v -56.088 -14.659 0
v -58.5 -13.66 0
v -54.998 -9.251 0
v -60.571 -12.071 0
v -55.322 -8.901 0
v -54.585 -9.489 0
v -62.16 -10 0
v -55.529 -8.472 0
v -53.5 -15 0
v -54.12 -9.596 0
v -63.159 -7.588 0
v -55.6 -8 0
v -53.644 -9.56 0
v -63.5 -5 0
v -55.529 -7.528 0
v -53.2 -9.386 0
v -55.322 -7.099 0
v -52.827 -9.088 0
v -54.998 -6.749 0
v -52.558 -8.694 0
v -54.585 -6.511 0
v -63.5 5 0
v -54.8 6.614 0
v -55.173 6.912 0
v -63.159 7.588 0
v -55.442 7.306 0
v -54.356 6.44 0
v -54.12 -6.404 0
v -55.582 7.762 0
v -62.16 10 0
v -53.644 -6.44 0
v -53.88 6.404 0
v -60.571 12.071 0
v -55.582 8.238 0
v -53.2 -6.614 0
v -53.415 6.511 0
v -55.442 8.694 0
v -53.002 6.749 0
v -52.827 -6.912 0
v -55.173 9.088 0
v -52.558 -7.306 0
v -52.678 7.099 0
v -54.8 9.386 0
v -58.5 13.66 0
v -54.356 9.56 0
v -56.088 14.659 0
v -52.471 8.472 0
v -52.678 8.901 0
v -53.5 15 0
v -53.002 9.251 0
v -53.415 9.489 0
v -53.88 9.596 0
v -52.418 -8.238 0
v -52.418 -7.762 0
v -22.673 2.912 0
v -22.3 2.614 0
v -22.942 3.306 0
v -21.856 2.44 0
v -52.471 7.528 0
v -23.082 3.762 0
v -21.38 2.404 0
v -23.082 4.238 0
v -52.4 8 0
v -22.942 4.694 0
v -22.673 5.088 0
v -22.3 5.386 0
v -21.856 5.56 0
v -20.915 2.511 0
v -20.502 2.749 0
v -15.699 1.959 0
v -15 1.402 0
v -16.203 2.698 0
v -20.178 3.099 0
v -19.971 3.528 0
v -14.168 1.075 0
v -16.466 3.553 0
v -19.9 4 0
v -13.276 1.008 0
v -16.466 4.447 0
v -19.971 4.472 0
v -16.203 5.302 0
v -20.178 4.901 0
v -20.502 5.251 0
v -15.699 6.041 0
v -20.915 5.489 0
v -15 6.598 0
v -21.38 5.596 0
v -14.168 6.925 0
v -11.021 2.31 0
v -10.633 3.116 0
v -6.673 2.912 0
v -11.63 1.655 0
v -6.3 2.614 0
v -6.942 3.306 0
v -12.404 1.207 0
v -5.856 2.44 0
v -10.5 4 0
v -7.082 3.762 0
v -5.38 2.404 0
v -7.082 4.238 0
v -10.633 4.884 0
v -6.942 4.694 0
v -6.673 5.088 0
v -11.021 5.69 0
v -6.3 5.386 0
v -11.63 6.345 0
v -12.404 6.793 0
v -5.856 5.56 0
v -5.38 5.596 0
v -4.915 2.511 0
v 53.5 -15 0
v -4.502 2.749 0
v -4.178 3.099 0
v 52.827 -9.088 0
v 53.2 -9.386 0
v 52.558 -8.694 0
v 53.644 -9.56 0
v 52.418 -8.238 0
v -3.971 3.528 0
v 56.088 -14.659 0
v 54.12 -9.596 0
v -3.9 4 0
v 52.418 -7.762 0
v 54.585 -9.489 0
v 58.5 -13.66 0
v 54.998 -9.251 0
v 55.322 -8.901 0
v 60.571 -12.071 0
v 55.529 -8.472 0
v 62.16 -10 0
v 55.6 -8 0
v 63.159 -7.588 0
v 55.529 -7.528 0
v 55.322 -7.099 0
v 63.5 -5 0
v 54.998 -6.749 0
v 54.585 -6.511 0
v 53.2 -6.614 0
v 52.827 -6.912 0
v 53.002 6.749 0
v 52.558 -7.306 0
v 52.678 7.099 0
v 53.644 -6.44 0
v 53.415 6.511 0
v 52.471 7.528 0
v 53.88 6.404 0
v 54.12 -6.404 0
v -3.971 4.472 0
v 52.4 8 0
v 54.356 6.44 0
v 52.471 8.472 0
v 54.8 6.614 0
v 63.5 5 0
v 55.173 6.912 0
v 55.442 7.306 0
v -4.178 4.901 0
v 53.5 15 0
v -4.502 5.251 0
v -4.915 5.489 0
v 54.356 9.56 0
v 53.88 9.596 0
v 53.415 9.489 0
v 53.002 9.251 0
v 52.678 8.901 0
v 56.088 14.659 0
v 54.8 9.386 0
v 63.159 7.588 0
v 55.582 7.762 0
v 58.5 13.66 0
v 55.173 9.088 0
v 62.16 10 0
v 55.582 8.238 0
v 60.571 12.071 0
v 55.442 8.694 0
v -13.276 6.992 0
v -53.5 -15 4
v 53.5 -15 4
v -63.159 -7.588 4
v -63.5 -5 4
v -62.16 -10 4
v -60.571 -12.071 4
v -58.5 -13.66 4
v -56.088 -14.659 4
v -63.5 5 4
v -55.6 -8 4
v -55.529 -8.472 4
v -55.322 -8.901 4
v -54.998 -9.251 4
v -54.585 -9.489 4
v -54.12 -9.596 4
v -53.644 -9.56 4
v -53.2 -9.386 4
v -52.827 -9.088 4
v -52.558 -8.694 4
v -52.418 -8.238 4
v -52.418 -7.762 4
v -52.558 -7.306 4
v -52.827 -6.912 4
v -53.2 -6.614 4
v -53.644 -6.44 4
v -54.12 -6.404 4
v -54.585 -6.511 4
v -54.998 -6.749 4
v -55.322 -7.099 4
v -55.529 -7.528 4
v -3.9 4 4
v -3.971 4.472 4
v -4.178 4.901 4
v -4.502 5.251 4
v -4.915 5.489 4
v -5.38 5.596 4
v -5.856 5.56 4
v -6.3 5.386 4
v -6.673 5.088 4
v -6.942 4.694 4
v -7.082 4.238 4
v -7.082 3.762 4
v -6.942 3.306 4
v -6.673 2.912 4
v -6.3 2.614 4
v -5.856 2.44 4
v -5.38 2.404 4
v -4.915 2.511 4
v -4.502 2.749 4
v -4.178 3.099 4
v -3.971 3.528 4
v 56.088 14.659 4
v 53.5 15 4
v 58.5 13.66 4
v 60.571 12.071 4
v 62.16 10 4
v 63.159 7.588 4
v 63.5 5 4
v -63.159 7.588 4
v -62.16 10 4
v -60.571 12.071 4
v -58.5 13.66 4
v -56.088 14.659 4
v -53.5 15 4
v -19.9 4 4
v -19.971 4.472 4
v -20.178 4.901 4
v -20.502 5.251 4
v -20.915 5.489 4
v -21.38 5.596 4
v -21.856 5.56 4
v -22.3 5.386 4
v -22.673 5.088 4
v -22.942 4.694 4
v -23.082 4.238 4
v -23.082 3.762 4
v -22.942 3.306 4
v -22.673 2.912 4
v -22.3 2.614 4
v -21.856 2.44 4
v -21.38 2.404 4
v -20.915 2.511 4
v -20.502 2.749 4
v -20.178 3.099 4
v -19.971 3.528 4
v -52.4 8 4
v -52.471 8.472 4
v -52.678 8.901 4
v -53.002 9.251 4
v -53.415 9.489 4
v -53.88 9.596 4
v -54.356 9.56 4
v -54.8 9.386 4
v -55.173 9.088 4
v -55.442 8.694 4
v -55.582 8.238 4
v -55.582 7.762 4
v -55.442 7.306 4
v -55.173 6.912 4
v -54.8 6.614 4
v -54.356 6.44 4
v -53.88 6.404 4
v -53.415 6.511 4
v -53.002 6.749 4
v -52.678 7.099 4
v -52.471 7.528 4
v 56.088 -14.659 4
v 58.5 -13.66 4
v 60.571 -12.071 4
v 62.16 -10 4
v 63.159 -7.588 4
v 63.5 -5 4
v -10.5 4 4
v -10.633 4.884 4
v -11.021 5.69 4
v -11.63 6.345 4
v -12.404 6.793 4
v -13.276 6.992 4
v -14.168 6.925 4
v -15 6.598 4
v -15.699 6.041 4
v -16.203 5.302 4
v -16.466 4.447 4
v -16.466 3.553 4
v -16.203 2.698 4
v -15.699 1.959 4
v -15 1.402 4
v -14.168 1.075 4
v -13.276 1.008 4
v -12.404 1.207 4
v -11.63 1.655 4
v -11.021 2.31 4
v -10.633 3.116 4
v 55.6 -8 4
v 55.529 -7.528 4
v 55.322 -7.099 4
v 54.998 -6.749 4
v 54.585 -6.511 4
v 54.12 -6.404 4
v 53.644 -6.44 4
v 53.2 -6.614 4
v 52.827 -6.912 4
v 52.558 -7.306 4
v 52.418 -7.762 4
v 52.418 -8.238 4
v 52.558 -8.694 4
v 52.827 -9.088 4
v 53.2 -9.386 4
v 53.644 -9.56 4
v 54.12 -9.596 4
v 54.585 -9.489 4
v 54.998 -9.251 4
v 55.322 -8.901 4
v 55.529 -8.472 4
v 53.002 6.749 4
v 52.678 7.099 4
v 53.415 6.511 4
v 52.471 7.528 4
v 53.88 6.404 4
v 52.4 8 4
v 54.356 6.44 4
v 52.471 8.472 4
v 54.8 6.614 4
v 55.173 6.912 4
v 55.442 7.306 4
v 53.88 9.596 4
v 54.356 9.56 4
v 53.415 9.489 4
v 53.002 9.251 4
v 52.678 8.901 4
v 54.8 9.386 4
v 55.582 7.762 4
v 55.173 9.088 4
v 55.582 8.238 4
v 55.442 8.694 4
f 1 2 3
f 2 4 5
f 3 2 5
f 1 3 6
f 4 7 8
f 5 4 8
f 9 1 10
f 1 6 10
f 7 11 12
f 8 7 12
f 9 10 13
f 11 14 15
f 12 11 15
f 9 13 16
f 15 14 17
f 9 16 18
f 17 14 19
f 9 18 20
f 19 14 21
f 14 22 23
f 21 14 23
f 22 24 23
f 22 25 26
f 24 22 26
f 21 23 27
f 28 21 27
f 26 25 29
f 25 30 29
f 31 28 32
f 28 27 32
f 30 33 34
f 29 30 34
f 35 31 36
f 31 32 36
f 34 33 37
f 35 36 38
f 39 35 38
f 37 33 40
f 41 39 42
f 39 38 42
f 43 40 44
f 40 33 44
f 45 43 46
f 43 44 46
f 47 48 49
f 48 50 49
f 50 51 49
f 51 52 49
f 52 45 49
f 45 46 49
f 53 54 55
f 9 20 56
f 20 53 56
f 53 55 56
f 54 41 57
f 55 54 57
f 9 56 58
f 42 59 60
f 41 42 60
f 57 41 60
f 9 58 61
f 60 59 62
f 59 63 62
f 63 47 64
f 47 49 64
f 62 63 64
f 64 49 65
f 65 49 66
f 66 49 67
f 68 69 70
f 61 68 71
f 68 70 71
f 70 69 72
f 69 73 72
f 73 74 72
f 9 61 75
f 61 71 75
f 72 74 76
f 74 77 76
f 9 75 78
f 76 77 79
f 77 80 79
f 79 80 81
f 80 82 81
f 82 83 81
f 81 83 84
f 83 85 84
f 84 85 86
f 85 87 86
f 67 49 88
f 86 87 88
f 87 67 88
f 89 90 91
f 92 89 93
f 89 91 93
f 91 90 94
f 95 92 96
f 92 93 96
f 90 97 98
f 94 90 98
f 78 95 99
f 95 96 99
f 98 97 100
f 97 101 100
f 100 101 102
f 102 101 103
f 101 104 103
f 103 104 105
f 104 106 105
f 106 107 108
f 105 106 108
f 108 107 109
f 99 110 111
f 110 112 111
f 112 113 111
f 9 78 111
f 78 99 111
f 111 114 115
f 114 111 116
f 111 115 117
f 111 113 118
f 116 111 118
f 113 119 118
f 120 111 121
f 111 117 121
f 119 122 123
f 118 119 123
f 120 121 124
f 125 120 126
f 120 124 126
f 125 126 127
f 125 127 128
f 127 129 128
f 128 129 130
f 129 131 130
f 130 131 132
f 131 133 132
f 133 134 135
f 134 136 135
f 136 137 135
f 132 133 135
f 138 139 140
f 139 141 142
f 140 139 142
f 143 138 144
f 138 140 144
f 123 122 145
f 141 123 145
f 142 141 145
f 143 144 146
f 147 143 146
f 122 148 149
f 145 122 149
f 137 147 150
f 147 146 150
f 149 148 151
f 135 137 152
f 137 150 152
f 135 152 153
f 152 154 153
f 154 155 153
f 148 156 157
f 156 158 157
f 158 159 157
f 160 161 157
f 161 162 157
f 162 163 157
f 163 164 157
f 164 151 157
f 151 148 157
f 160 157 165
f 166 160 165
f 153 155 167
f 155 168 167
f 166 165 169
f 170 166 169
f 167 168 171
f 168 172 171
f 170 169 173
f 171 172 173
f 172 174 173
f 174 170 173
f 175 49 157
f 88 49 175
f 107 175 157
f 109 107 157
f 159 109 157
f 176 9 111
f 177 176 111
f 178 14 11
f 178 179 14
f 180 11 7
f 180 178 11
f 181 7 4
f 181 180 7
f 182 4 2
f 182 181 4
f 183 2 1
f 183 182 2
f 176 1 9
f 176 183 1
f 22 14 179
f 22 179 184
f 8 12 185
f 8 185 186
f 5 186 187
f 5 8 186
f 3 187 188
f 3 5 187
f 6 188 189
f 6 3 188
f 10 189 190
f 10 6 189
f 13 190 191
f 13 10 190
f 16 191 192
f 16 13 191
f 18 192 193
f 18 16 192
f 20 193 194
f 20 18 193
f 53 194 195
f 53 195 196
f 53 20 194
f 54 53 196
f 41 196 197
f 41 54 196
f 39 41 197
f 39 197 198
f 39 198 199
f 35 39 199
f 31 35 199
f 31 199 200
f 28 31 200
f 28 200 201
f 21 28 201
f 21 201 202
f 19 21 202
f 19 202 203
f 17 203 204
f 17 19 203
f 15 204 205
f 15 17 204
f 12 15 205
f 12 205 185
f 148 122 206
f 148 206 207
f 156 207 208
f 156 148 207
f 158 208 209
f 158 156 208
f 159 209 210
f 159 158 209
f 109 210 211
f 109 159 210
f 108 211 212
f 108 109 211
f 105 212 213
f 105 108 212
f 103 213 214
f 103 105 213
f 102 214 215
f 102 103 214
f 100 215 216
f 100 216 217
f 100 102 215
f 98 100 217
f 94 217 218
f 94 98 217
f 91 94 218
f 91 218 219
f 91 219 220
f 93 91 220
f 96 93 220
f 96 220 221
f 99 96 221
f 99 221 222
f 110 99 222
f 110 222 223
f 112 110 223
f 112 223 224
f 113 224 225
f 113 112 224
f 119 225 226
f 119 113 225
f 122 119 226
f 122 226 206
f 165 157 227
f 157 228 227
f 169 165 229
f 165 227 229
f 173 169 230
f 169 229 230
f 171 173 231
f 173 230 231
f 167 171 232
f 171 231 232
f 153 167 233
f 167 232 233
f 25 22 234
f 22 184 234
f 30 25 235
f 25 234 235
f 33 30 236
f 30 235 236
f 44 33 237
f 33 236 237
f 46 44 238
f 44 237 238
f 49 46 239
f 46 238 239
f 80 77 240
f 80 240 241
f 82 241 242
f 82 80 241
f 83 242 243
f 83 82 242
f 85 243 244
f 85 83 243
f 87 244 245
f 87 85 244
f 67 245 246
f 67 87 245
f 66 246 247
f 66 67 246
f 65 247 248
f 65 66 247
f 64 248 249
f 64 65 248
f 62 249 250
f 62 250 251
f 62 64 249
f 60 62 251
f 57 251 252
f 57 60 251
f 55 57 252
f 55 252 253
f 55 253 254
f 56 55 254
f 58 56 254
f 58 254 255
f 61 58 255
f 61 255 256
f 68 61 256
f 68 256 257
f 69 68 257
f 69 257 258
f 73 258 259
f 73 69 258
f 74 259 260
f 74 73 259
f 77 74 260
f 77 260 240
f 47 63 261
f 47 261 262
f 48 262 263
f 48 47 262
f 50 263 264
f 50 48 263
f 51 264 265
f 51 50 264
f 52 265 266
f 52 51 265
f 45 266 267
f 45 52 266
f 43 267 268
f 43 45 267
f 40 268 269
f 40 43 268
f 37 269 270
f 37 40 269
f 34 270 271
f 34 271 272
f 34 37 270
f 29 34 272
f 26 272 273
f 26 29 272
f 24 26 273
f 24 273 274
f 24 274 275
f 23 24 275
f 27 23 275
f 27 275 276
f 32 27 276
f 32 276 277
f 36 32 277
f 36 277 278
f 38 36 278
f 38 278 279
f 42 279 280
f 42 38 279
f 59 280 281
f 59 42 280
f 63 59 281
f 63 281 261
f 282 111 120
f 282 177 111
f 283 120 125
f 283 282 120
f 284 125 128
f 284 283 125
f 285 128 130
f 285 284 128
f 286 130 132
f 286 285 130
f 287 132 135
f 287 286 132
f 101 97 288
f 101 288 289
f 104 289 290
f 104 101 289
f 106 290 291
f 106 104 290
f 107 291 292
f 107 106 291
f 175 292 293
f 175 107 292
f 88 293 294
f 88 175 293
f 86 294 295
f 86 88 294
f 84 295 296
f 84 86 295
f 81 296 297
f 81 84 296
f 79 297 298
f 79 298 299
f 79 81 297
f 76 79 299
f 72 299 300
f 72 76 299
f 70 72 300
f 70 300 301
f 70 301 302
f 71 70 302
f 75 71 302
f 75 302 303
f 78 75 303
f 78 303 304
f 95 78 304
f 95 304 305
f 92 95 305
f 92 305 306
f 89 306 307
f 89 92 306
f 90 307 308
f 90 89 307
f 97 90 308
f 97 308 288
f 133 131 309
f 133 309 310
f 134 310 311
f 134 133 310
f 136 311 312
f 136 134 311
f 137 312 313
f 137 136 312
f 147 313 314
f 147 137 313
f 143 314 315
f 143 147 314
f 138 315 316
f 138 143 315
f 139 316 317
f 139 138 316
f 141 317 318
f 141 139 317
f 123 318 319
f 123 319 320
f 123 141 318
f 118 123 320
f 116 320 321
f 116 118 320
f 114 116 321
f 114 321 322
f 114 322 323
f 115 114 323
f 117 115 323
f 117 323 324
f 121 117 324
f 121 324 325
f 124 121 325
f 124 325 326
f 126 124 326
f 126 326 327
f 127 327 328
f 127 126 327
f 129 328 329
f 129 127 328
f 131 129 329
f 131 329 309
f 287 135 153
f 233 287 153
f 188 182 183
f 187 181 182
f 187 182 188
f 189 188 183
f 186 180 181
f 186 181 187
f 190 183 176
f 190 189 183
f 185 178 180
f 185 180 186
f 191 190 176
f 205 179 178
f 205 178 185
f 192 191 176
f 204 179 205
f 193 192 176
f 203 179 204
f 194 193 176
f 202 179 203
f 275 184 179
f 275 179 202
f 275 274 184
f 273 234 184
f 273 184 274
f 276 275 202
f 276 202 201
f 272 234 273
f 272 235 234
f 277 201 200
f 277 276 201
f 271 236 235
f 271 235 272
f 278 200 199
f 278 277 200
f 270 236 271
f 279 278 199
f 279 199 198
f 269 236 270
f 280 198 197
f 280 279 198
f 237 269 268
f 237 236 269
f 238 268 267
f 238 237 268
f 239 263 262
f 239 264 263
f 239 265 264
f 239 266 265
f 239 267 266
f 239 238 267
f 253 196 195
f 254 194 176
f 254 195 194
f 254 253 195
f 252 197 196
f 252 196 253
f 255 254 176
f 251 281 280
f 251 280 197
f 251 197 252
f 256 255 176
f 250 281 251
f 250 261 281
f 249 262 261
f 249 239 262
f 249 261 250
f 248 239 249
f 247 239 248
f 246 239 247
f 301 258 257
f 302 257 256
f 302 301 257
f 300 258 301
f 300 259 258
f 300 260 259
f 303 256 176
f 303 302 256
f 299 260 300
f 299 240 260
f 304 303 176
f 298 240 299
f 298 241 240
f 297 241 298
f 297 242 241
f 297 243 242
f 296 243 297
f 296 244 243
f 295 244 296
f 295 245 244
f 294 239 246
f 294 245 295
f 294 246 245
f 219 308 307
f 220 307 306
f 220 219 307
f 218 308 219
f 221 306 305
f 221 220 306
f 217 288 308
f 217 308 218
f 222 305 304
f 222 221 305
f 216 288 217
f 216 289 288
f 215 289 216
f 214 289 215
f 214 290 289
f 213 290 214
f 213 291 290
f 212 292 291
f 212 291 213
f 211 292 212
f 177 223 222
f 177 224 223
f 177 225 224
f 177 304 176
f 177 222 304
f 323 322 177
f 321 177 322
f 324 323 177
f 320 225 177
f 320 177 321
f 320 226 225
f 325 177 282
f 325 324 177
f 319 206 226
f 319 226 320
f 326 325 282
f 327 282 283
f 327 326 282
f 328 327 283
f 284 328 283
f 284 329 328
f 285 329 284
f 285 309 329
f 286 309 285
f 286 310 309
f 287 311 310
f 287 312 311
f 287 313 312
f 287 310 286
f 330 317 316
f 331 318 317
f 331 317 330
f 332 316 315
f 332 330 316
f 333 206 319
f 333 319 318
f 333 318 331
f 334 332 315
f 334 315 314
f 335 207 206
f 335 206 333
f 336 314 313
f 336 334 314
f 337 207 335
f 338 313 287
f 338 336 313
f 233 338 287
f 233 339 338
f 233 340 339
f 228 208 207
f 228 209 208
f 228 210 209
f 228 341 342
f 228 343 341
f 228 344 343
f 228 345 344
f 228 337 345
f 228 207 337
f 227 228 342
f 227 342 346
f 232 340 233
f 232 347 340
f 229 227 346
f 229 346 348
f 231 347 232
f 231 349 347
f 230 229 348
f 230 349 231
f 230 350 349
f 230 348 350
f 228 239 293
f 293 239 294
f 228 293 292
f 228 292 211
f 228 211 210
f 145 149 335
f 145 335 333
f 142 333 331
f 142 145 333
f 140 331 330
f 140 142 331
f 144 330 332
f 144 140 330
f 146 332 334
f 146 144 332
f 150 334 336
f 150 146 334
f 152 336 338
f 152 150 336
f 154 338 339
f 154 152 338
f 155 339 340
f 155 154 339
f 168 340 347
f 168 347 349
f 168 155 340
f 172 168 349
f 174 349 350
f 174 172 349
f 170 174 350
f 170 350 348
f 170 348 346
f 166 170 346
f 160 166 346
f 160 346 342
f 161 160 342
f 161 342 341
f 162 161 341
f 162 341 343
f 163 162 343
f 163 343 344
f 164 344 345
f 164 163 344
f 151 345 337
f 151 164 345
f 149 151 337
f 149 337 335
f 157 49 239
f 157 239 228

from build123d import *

# Parameters (mm, degrees)
ESBO_O1_W                = 127
ESBO_O1_H                = 30
ESBO_O1_R                = 3
ESBO_O1_R_2              = 1.6
RESSALTO_EXTRUS_O1_DEPTH = 4
FILETE1_R                = 10


with BuildPart() as part:
    # Esboço1 → Ressalto-extrusão1 (new body)
    with BuildSketch(Plane.XY):
        Rectangle(ESBO_O1_W, ESBO_O1_H)
        with Locations((-13.5, 4)):
            Circle(ESBO_O1_R, mode=Mode.SUBTRACT)
        with Locations((-5.5, 4)):
            Circle(ESBO_O1_R_2, mode=Mode.SUBTRACT)
        with Locations((-21.5, 4)):
            Circle(ESBO_O1_R_2, mode=Mode.SUBTRACT)
        with Locations((-54, 8)):
            Circle(ESBO_O1_R_2, mode=Mode.SUBTRACT)
        with Locations(Location((-54, -8, 0), (0, 0, 180))):
            Circle(ESBO_O1_R_2, mode=Mode.SUBTRACT)
        with Locations((54, -8)):
            Circle(ESBO_O1_R_2, mode=Mode.SUBTRACT)
        with Locations(Location((54, 8, 0), (0, 0, 180))):
            Circle(ESBO_O1_R_2, mode=Mode.SUBTRACT)
    extrude(amount=RESSALTO_EXTRUS_O1_DEPTH)

    # Filete1
    filete1_edges = [part.edges().sort_by_distance(p)[0] for p in [
        (63.5, -15, 2),
        (-63.5, -15, 2),
        (-63.5, 15, 2),
        (63.5, 15, 2),
    ]]
    fillet(filete1_edges, radius=FILETE1_R)


solid = part.part
